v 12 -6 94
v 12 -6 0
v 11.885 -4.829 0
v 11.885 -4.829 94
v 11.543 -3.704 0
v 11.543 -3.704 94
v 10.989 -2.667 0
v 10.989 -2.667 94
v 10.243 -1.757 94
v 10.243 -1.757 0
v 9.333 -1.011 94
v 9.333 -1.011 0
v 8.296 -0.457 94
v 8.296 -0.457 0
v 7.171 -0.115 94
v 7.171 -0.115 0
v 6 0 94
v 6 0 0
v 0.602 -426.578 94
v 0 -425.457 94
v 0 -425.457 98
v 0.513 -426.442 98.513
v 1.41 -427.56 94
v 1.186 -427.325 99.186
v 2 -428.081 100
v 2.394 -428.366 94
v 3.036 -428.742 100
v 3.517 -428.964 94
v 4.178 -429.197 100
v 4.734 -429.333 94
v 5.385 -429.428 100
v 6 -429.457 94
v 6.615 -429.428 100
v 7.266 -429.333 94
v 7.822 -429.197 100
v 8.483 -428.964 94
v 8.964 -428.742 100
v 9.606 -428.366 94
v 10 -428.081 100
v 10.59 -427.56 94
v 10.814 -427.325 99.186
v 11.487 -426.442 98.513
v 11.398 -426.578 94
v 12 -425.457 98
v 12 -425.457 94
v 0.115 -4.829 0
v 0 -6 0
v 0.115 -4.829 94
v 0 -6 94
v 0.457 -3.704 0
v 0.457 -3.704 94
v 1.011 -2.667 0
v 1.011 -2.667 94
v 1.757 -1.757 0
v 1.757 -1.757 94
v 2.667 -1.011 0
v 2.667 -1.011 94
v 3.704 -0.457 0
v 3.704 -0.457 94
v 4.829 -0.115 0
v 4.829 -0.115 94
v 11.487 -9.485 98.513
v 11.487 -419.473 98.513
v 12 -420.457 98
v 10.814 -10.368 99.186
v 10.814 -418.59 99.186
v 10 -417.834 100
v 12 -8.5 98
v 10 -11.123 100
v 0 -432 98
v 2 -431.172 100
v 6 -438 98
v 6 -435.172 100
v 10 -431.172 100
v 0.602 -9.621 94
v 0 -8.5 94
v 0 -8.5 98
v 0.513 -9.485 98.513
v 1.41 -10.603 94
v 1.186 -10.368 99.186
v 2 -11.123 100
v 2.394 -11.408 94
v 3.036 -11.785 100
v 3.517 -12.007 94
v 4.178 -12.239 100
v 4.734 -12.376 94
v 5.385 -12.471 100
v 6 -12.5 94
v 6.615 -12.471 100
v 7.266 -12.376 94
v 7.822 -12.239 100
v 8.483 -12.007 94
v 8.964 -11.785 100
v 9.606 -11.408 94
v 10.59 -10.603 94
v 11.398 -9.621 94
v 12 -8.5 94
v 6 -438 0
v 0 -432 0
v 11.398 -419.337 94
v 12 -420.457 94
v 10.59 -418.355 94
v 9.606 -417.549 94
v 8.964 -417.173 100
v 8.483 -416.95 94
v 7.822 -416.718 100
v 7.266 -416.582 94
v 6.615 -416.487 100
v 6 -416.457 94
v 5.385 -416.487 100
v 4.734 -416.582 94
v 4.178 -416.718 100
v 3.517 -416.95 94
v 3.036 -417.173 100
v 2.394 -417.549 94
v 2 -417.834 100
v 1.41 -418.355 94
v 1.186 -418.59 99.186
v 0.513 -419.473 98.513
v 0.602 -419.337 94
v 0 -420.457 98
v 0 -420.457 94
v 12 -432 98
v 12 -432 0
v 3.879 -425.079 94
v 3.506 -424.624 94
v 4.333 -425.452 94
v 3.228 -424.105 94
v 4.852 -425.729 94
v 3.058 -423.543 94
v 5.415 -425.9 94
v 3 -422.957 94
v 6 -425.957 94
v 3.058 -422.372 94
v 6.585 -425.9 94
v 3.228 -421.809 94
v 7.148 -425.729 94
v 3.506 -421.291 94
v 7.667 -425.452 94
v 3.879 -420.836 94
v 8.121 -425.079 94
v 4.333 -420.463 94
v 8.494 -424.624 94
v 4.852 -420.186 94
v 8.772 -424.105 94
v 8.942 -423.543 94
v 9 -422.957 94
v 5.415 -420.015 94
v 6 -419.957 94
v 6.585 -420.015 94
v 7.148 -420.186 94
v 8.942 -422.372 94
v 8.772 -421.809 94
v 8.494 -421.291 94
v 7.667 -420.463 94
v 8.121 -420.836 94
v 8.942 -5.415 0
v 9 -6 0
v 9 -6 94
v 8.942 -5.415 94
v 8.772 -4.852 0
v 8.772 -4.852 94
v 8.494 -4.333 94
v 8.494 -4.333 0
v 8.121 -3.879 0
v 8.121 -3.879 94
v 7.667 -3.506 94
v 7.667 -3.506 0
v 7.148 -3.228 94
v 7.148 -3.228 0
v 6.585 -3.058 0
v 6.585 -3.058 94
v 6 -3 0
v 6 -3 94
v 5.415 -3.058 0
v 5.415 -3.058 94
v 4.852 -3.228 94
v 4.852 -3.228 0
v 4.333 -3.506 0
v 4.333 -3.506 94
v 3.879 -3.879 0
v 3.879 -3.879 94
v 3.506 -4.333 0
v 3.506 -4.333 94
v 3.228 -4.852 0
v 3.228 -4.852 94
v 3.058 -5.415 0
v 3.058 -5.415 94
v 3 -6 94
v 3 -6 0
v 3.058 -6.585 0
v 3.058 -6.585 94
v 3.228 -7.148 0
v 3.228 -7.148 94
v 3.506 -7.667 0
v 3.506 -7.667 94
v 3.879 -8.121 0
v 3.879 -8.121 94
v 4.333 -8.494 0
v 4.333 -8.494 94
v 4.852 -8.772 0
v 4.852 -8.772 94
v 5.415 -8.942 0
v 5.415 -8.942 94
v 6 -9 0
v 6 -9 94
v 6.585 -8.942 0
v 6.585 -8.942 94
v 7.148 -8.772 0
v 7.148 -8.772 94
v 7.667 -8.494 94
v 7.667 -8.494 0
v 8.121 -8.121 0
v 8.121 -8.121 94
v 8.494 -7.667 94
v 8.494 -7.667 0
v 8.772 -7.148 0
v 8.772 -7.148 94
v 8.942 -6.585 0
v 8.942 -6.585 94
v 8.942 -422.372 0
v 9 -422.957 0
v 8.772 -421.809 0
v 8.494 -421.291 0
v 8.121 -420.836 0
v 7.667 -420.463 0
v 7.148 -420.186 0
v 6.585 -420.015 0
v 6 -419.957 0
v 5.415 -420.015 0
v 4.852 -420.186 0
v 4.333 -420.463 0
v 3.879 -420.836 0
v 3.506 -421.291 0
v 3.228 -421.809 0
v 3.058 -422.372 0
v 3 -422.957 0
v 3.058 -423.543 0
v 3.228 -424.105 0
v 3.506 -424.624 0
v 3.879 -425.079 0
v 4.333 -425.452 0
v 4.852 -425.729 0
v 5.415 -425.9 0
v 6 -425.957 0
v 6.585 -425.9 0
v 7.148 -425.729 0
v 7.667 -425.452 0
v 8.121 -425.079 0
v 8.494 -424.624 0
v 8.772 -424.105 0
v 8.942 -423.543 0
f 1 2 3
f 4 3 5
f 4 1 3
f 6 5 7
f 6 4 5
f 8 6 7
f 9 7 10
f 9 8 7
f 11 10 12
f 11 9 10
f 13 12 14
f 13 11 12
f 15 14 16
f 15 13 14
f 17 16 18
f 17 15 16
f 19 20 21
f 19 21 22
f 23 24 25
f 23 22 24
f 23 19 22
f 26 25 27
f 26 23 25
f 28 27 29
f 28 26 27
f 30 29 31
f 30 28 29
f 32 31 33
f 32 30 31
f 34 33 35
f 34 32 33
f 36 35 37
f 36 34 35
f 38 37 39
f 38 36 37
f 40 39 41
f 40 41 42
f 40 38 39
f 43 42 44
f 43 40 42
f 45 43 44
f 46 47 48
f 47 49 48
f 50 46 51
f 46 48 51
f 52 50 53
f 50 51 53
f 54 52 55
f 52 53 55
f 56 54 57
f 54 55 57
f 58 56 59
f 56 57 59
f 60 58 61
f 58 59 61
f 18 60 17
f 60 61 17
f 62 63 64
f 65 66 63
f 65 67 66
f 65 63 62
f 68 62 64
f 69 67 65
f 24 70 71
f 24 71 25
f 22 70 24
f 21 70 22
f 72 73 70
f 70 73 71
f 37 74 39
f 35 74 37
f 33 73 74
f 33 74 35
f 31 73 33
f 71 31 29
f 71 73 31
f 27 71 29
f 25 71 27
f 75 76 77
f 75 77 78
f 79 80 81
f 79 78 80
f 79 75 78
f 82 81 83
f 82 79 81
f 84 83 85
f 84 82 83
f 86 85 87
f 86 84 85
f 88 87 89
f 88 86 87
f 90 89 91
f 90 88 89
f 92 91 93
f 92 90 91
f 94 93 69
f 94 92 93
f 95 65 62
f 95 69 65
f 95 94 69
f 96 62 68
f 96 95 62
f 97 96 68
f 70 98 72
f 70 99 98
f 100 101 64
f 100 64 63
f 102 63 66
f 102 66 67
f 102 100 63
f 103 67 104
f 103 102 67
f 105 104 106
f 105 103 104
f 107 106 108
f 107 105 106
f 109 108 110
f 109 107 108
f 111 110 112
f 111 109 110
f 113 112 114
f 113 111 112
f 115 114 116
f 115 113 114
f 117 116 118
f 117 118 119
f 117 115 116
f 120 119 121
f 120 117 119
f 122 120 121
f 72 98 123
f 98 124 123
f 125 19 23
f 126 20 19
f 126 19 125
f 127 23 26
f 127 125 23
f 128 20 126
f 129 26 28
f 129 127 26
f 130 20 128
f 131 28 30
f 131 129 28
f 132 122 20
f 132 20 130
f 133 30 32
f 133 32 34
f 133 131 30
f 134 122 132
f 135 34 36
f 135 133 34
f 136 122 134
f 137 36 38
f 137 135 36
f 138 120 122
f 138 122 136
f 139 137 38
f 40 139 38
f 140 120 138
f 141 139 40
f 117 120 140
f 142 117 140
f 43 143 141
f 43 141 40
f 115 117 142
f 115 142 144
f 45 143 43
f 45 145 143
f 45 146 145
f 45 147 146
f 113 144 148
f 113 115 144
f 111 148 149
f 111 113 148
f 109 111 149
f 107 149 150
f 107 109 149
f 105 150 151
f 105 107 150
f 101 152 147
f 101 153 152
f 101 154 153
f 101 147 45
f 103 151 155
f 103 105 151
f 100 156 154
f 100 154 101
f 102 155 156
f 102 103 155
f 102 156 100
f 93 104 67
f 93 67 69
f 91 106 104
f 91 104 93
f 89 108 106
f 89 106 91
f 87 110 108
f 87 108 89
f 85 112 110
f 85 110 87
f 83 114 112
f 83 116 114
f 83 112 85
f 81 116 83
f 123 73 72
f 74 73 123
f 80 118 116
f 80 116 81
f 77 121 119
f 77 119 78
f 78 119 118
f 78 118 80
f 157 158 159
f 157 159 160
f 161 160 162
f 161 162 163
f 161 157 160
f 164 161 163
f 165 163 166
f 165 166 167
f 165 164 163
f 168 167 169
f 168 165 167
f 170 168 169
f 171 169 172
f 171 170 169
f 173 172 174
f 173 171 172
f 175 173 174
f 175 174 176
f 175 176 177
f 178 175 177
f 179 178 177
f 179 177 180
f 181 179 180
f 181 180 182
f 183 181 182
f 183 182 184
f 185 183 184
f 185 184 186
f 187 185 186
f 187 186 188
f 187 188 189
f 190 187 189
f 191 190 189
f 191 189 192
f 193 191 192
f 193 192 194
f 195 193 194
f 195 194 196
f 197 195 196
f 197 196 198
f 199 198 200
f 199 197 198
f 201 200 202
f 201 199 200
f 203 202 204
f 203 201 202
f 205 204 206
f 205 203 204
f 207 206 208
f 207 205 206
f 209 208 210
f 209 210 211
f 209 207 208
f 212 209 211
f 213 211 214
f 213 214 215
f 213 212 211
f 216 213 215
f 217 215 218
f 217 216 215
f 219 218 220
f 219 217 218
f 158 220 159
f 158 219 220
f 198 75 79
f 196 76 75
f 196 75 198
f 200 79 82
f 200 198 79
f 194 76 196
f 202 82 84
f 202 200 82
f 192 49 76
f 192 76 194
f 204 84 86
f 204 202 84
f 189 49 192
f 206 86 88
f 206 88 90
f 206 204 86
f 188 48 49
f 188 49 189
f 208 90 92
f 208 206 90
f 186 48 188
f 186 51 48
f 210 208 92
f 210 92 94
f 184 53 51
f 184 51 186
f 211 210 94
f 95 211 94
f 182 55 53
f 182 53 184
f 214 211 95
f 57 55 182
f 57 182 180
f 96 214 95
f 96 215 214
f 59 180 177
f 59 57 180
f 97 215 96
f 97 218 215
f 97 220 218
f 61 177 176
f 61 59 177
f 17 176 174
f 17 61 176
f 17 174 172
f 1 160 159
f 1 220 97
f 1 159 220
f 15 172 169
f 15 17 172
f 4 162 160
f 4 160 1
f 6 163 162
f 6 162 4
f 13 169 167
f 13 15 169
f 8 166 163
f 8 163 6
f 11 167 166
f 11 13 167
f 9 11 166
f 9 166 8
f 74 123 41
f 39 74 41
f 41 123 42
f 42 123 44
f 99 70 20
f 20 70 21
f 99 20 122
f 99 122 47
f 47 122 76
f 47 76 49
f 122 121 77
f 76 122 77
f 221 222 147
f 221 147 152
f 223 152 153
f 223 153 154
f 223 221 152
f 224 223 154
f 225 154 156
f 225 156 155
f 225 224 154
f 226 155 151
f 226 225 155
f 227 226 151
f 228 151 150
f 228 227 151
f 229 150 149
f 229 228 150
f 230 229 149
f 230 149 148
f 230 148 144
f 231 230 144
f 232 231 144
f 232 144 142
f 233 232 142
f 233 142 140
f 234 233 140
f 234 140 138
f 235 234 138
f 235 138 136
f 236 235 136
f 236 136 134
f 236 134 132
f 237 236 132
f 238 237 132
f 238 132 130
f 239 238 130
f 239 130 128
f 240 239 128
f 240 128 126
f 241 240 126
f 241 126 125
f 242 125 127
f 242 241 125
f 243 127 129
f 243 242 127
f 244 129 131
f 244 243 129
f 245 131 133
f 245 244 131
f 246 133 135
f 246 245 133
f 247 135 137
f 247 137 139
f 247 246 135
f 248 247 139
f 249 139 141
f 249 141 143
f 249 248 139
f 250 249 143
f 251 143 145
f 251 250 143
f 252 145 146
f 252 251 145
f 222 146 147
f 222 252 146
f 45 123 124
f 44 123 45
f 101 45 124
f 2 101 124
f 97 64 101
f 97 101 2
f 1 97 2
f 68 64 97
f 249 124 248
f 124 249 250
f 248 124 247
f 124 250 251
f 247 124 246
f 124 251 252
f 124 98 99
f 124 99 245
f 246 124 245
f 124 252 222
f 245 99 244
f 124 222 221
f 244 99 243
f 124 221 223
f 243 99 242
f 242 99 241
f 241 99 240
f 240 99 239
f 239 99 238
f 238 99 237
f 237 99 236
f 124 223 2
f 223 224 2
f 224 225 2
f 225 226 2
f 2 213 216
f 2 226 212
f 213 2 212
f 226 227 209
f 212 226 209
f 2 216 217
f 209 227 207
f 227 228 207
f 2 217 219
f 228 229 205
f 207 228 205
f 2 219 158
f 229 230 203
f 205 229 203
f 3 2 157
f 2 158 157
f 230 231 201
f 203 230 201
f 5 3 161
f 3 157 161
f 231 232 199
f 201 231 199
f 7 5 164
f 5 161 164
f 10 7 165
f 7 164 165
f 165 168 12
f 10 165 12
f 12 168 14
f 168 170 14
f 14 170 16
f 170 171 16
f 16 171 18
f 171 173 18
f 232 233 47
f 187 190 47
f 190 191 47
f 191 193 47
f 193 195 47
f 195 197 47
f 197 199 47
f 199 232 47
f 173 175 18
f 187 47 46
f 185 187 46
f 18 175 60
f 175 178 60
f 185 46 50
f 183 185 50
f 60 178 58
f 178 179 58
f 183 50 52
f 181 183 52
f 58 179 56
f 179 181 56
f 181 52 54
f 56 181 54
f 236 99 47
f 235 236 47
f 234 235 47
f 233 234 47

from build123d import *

# Parameters (mm, degrees)
F0_W     = 438
F0_H     = 100
F1_DEPTH = 12
F2_R     = 3
F3_DEPTH = 120
F4_START = 94
F2_R_2   = 6.5
F4_DEPTH = 6
F5_SIZE  = 5.99999
F6_SIZE  = 2
F7_R     = 5.99999


# Not quite as in the source:
# - a fillet or chamfer is up to 0.001 mm smaller than in the source, because OpenCascade refuses the exact size


with BuildPart() as f1:
    # F0 (on Right) → F1 (new body)
    with BuildSketch(Plane.YZ):
        with Locations((-219, 50)):
            Rectangle(F0_W, F0_H)
    extrude(amount=F1_DEPTH)

    # F2 (on Top) → F3 (cut)
    with BuildSketch(Plane.XY):
        with Locations((6, -422.9574446679)):
            Circle(F2_R)
        with Locations((6, -6)):
            Circle(F2_R)
    extrude(amount=F3_DEPTH, mode=Mode.SUBTRACT)

    # F2 (on Top) → F4 (cut)
    with BuildSketch(Plane.XY.offset(F4_START)):
        with Locations((6, -6)):
            Circle(F2_R_2)
        with Locations((6, -6)):
            Circle(F2_R, mode=Mode.SUBTRACT)
        with Locations((6, -422.9574446679)):
            Circle(F2_R_2)
        with Locations((6, -422.9574446679)):
            Circle(F2_R, mode=Mode.SUBTRACT)
    extrude(amount=F4_DEPTH, mode=Mode.SUBTRACT)

    # F5 (size 6 in the source; OpenCascade refuses exactly that, so slightly less here)
    f5_edges = [f1.edges().sort_by_distance(p)[0] for p in [
        (12, -438, 50),
        (0, -438, 50),
    ]]
    chamfer(f5_edges, length=F5_SIZE)

    # F6 (call 1 of 4: OpenCascade refuses the feature's edges together)
    f6_edges = [f1.edges().sort_by_distance(p)[0] for p in [
        (12, -428.728727, 100),
        (9.000005, -435.000005, 100),
    ]]
    chamfer(f6_edges, length=F6_SIZE)

    # F6#2 (call 2 of 4)
    f6_2_edges = [f1.edges().sort_by_distance(p)[0] for p in [
        (0, -428.728727, 100),
        (2.999995, -435.000005, 100),
    ]]
    chamfer(f6_2_edges, length=F6_SIZE)

    # F6#3 (call 3 of 4)
    f6_3_edges = [f1.edges().sort_by_distance(p)[0] for p in [
        (12, -214.478722, 100),
    ]]
    chamfer(f6_3_edges, length=F6_SIZE)

    # F6#4 (call 4 of 4)
    f6_4_edges = [f1.edges().sort_by_distance(p)[0] for p in [
        (0, -214.478722, 100),
    ]]
    chamfer(f6_4_edges, length=F6_SIZE)

    # F7 (radius 6 in the source; OpenCascade refuses exactly that, so slightly less here)
    f7_edges = [f1.edges().sort_by_distance(p)[0] for p in [
        (12, 0, 50),
        (0, 0, 50),
    ]]
    fillet(f7_edges, radius=F7_R)


solid = f1.part
